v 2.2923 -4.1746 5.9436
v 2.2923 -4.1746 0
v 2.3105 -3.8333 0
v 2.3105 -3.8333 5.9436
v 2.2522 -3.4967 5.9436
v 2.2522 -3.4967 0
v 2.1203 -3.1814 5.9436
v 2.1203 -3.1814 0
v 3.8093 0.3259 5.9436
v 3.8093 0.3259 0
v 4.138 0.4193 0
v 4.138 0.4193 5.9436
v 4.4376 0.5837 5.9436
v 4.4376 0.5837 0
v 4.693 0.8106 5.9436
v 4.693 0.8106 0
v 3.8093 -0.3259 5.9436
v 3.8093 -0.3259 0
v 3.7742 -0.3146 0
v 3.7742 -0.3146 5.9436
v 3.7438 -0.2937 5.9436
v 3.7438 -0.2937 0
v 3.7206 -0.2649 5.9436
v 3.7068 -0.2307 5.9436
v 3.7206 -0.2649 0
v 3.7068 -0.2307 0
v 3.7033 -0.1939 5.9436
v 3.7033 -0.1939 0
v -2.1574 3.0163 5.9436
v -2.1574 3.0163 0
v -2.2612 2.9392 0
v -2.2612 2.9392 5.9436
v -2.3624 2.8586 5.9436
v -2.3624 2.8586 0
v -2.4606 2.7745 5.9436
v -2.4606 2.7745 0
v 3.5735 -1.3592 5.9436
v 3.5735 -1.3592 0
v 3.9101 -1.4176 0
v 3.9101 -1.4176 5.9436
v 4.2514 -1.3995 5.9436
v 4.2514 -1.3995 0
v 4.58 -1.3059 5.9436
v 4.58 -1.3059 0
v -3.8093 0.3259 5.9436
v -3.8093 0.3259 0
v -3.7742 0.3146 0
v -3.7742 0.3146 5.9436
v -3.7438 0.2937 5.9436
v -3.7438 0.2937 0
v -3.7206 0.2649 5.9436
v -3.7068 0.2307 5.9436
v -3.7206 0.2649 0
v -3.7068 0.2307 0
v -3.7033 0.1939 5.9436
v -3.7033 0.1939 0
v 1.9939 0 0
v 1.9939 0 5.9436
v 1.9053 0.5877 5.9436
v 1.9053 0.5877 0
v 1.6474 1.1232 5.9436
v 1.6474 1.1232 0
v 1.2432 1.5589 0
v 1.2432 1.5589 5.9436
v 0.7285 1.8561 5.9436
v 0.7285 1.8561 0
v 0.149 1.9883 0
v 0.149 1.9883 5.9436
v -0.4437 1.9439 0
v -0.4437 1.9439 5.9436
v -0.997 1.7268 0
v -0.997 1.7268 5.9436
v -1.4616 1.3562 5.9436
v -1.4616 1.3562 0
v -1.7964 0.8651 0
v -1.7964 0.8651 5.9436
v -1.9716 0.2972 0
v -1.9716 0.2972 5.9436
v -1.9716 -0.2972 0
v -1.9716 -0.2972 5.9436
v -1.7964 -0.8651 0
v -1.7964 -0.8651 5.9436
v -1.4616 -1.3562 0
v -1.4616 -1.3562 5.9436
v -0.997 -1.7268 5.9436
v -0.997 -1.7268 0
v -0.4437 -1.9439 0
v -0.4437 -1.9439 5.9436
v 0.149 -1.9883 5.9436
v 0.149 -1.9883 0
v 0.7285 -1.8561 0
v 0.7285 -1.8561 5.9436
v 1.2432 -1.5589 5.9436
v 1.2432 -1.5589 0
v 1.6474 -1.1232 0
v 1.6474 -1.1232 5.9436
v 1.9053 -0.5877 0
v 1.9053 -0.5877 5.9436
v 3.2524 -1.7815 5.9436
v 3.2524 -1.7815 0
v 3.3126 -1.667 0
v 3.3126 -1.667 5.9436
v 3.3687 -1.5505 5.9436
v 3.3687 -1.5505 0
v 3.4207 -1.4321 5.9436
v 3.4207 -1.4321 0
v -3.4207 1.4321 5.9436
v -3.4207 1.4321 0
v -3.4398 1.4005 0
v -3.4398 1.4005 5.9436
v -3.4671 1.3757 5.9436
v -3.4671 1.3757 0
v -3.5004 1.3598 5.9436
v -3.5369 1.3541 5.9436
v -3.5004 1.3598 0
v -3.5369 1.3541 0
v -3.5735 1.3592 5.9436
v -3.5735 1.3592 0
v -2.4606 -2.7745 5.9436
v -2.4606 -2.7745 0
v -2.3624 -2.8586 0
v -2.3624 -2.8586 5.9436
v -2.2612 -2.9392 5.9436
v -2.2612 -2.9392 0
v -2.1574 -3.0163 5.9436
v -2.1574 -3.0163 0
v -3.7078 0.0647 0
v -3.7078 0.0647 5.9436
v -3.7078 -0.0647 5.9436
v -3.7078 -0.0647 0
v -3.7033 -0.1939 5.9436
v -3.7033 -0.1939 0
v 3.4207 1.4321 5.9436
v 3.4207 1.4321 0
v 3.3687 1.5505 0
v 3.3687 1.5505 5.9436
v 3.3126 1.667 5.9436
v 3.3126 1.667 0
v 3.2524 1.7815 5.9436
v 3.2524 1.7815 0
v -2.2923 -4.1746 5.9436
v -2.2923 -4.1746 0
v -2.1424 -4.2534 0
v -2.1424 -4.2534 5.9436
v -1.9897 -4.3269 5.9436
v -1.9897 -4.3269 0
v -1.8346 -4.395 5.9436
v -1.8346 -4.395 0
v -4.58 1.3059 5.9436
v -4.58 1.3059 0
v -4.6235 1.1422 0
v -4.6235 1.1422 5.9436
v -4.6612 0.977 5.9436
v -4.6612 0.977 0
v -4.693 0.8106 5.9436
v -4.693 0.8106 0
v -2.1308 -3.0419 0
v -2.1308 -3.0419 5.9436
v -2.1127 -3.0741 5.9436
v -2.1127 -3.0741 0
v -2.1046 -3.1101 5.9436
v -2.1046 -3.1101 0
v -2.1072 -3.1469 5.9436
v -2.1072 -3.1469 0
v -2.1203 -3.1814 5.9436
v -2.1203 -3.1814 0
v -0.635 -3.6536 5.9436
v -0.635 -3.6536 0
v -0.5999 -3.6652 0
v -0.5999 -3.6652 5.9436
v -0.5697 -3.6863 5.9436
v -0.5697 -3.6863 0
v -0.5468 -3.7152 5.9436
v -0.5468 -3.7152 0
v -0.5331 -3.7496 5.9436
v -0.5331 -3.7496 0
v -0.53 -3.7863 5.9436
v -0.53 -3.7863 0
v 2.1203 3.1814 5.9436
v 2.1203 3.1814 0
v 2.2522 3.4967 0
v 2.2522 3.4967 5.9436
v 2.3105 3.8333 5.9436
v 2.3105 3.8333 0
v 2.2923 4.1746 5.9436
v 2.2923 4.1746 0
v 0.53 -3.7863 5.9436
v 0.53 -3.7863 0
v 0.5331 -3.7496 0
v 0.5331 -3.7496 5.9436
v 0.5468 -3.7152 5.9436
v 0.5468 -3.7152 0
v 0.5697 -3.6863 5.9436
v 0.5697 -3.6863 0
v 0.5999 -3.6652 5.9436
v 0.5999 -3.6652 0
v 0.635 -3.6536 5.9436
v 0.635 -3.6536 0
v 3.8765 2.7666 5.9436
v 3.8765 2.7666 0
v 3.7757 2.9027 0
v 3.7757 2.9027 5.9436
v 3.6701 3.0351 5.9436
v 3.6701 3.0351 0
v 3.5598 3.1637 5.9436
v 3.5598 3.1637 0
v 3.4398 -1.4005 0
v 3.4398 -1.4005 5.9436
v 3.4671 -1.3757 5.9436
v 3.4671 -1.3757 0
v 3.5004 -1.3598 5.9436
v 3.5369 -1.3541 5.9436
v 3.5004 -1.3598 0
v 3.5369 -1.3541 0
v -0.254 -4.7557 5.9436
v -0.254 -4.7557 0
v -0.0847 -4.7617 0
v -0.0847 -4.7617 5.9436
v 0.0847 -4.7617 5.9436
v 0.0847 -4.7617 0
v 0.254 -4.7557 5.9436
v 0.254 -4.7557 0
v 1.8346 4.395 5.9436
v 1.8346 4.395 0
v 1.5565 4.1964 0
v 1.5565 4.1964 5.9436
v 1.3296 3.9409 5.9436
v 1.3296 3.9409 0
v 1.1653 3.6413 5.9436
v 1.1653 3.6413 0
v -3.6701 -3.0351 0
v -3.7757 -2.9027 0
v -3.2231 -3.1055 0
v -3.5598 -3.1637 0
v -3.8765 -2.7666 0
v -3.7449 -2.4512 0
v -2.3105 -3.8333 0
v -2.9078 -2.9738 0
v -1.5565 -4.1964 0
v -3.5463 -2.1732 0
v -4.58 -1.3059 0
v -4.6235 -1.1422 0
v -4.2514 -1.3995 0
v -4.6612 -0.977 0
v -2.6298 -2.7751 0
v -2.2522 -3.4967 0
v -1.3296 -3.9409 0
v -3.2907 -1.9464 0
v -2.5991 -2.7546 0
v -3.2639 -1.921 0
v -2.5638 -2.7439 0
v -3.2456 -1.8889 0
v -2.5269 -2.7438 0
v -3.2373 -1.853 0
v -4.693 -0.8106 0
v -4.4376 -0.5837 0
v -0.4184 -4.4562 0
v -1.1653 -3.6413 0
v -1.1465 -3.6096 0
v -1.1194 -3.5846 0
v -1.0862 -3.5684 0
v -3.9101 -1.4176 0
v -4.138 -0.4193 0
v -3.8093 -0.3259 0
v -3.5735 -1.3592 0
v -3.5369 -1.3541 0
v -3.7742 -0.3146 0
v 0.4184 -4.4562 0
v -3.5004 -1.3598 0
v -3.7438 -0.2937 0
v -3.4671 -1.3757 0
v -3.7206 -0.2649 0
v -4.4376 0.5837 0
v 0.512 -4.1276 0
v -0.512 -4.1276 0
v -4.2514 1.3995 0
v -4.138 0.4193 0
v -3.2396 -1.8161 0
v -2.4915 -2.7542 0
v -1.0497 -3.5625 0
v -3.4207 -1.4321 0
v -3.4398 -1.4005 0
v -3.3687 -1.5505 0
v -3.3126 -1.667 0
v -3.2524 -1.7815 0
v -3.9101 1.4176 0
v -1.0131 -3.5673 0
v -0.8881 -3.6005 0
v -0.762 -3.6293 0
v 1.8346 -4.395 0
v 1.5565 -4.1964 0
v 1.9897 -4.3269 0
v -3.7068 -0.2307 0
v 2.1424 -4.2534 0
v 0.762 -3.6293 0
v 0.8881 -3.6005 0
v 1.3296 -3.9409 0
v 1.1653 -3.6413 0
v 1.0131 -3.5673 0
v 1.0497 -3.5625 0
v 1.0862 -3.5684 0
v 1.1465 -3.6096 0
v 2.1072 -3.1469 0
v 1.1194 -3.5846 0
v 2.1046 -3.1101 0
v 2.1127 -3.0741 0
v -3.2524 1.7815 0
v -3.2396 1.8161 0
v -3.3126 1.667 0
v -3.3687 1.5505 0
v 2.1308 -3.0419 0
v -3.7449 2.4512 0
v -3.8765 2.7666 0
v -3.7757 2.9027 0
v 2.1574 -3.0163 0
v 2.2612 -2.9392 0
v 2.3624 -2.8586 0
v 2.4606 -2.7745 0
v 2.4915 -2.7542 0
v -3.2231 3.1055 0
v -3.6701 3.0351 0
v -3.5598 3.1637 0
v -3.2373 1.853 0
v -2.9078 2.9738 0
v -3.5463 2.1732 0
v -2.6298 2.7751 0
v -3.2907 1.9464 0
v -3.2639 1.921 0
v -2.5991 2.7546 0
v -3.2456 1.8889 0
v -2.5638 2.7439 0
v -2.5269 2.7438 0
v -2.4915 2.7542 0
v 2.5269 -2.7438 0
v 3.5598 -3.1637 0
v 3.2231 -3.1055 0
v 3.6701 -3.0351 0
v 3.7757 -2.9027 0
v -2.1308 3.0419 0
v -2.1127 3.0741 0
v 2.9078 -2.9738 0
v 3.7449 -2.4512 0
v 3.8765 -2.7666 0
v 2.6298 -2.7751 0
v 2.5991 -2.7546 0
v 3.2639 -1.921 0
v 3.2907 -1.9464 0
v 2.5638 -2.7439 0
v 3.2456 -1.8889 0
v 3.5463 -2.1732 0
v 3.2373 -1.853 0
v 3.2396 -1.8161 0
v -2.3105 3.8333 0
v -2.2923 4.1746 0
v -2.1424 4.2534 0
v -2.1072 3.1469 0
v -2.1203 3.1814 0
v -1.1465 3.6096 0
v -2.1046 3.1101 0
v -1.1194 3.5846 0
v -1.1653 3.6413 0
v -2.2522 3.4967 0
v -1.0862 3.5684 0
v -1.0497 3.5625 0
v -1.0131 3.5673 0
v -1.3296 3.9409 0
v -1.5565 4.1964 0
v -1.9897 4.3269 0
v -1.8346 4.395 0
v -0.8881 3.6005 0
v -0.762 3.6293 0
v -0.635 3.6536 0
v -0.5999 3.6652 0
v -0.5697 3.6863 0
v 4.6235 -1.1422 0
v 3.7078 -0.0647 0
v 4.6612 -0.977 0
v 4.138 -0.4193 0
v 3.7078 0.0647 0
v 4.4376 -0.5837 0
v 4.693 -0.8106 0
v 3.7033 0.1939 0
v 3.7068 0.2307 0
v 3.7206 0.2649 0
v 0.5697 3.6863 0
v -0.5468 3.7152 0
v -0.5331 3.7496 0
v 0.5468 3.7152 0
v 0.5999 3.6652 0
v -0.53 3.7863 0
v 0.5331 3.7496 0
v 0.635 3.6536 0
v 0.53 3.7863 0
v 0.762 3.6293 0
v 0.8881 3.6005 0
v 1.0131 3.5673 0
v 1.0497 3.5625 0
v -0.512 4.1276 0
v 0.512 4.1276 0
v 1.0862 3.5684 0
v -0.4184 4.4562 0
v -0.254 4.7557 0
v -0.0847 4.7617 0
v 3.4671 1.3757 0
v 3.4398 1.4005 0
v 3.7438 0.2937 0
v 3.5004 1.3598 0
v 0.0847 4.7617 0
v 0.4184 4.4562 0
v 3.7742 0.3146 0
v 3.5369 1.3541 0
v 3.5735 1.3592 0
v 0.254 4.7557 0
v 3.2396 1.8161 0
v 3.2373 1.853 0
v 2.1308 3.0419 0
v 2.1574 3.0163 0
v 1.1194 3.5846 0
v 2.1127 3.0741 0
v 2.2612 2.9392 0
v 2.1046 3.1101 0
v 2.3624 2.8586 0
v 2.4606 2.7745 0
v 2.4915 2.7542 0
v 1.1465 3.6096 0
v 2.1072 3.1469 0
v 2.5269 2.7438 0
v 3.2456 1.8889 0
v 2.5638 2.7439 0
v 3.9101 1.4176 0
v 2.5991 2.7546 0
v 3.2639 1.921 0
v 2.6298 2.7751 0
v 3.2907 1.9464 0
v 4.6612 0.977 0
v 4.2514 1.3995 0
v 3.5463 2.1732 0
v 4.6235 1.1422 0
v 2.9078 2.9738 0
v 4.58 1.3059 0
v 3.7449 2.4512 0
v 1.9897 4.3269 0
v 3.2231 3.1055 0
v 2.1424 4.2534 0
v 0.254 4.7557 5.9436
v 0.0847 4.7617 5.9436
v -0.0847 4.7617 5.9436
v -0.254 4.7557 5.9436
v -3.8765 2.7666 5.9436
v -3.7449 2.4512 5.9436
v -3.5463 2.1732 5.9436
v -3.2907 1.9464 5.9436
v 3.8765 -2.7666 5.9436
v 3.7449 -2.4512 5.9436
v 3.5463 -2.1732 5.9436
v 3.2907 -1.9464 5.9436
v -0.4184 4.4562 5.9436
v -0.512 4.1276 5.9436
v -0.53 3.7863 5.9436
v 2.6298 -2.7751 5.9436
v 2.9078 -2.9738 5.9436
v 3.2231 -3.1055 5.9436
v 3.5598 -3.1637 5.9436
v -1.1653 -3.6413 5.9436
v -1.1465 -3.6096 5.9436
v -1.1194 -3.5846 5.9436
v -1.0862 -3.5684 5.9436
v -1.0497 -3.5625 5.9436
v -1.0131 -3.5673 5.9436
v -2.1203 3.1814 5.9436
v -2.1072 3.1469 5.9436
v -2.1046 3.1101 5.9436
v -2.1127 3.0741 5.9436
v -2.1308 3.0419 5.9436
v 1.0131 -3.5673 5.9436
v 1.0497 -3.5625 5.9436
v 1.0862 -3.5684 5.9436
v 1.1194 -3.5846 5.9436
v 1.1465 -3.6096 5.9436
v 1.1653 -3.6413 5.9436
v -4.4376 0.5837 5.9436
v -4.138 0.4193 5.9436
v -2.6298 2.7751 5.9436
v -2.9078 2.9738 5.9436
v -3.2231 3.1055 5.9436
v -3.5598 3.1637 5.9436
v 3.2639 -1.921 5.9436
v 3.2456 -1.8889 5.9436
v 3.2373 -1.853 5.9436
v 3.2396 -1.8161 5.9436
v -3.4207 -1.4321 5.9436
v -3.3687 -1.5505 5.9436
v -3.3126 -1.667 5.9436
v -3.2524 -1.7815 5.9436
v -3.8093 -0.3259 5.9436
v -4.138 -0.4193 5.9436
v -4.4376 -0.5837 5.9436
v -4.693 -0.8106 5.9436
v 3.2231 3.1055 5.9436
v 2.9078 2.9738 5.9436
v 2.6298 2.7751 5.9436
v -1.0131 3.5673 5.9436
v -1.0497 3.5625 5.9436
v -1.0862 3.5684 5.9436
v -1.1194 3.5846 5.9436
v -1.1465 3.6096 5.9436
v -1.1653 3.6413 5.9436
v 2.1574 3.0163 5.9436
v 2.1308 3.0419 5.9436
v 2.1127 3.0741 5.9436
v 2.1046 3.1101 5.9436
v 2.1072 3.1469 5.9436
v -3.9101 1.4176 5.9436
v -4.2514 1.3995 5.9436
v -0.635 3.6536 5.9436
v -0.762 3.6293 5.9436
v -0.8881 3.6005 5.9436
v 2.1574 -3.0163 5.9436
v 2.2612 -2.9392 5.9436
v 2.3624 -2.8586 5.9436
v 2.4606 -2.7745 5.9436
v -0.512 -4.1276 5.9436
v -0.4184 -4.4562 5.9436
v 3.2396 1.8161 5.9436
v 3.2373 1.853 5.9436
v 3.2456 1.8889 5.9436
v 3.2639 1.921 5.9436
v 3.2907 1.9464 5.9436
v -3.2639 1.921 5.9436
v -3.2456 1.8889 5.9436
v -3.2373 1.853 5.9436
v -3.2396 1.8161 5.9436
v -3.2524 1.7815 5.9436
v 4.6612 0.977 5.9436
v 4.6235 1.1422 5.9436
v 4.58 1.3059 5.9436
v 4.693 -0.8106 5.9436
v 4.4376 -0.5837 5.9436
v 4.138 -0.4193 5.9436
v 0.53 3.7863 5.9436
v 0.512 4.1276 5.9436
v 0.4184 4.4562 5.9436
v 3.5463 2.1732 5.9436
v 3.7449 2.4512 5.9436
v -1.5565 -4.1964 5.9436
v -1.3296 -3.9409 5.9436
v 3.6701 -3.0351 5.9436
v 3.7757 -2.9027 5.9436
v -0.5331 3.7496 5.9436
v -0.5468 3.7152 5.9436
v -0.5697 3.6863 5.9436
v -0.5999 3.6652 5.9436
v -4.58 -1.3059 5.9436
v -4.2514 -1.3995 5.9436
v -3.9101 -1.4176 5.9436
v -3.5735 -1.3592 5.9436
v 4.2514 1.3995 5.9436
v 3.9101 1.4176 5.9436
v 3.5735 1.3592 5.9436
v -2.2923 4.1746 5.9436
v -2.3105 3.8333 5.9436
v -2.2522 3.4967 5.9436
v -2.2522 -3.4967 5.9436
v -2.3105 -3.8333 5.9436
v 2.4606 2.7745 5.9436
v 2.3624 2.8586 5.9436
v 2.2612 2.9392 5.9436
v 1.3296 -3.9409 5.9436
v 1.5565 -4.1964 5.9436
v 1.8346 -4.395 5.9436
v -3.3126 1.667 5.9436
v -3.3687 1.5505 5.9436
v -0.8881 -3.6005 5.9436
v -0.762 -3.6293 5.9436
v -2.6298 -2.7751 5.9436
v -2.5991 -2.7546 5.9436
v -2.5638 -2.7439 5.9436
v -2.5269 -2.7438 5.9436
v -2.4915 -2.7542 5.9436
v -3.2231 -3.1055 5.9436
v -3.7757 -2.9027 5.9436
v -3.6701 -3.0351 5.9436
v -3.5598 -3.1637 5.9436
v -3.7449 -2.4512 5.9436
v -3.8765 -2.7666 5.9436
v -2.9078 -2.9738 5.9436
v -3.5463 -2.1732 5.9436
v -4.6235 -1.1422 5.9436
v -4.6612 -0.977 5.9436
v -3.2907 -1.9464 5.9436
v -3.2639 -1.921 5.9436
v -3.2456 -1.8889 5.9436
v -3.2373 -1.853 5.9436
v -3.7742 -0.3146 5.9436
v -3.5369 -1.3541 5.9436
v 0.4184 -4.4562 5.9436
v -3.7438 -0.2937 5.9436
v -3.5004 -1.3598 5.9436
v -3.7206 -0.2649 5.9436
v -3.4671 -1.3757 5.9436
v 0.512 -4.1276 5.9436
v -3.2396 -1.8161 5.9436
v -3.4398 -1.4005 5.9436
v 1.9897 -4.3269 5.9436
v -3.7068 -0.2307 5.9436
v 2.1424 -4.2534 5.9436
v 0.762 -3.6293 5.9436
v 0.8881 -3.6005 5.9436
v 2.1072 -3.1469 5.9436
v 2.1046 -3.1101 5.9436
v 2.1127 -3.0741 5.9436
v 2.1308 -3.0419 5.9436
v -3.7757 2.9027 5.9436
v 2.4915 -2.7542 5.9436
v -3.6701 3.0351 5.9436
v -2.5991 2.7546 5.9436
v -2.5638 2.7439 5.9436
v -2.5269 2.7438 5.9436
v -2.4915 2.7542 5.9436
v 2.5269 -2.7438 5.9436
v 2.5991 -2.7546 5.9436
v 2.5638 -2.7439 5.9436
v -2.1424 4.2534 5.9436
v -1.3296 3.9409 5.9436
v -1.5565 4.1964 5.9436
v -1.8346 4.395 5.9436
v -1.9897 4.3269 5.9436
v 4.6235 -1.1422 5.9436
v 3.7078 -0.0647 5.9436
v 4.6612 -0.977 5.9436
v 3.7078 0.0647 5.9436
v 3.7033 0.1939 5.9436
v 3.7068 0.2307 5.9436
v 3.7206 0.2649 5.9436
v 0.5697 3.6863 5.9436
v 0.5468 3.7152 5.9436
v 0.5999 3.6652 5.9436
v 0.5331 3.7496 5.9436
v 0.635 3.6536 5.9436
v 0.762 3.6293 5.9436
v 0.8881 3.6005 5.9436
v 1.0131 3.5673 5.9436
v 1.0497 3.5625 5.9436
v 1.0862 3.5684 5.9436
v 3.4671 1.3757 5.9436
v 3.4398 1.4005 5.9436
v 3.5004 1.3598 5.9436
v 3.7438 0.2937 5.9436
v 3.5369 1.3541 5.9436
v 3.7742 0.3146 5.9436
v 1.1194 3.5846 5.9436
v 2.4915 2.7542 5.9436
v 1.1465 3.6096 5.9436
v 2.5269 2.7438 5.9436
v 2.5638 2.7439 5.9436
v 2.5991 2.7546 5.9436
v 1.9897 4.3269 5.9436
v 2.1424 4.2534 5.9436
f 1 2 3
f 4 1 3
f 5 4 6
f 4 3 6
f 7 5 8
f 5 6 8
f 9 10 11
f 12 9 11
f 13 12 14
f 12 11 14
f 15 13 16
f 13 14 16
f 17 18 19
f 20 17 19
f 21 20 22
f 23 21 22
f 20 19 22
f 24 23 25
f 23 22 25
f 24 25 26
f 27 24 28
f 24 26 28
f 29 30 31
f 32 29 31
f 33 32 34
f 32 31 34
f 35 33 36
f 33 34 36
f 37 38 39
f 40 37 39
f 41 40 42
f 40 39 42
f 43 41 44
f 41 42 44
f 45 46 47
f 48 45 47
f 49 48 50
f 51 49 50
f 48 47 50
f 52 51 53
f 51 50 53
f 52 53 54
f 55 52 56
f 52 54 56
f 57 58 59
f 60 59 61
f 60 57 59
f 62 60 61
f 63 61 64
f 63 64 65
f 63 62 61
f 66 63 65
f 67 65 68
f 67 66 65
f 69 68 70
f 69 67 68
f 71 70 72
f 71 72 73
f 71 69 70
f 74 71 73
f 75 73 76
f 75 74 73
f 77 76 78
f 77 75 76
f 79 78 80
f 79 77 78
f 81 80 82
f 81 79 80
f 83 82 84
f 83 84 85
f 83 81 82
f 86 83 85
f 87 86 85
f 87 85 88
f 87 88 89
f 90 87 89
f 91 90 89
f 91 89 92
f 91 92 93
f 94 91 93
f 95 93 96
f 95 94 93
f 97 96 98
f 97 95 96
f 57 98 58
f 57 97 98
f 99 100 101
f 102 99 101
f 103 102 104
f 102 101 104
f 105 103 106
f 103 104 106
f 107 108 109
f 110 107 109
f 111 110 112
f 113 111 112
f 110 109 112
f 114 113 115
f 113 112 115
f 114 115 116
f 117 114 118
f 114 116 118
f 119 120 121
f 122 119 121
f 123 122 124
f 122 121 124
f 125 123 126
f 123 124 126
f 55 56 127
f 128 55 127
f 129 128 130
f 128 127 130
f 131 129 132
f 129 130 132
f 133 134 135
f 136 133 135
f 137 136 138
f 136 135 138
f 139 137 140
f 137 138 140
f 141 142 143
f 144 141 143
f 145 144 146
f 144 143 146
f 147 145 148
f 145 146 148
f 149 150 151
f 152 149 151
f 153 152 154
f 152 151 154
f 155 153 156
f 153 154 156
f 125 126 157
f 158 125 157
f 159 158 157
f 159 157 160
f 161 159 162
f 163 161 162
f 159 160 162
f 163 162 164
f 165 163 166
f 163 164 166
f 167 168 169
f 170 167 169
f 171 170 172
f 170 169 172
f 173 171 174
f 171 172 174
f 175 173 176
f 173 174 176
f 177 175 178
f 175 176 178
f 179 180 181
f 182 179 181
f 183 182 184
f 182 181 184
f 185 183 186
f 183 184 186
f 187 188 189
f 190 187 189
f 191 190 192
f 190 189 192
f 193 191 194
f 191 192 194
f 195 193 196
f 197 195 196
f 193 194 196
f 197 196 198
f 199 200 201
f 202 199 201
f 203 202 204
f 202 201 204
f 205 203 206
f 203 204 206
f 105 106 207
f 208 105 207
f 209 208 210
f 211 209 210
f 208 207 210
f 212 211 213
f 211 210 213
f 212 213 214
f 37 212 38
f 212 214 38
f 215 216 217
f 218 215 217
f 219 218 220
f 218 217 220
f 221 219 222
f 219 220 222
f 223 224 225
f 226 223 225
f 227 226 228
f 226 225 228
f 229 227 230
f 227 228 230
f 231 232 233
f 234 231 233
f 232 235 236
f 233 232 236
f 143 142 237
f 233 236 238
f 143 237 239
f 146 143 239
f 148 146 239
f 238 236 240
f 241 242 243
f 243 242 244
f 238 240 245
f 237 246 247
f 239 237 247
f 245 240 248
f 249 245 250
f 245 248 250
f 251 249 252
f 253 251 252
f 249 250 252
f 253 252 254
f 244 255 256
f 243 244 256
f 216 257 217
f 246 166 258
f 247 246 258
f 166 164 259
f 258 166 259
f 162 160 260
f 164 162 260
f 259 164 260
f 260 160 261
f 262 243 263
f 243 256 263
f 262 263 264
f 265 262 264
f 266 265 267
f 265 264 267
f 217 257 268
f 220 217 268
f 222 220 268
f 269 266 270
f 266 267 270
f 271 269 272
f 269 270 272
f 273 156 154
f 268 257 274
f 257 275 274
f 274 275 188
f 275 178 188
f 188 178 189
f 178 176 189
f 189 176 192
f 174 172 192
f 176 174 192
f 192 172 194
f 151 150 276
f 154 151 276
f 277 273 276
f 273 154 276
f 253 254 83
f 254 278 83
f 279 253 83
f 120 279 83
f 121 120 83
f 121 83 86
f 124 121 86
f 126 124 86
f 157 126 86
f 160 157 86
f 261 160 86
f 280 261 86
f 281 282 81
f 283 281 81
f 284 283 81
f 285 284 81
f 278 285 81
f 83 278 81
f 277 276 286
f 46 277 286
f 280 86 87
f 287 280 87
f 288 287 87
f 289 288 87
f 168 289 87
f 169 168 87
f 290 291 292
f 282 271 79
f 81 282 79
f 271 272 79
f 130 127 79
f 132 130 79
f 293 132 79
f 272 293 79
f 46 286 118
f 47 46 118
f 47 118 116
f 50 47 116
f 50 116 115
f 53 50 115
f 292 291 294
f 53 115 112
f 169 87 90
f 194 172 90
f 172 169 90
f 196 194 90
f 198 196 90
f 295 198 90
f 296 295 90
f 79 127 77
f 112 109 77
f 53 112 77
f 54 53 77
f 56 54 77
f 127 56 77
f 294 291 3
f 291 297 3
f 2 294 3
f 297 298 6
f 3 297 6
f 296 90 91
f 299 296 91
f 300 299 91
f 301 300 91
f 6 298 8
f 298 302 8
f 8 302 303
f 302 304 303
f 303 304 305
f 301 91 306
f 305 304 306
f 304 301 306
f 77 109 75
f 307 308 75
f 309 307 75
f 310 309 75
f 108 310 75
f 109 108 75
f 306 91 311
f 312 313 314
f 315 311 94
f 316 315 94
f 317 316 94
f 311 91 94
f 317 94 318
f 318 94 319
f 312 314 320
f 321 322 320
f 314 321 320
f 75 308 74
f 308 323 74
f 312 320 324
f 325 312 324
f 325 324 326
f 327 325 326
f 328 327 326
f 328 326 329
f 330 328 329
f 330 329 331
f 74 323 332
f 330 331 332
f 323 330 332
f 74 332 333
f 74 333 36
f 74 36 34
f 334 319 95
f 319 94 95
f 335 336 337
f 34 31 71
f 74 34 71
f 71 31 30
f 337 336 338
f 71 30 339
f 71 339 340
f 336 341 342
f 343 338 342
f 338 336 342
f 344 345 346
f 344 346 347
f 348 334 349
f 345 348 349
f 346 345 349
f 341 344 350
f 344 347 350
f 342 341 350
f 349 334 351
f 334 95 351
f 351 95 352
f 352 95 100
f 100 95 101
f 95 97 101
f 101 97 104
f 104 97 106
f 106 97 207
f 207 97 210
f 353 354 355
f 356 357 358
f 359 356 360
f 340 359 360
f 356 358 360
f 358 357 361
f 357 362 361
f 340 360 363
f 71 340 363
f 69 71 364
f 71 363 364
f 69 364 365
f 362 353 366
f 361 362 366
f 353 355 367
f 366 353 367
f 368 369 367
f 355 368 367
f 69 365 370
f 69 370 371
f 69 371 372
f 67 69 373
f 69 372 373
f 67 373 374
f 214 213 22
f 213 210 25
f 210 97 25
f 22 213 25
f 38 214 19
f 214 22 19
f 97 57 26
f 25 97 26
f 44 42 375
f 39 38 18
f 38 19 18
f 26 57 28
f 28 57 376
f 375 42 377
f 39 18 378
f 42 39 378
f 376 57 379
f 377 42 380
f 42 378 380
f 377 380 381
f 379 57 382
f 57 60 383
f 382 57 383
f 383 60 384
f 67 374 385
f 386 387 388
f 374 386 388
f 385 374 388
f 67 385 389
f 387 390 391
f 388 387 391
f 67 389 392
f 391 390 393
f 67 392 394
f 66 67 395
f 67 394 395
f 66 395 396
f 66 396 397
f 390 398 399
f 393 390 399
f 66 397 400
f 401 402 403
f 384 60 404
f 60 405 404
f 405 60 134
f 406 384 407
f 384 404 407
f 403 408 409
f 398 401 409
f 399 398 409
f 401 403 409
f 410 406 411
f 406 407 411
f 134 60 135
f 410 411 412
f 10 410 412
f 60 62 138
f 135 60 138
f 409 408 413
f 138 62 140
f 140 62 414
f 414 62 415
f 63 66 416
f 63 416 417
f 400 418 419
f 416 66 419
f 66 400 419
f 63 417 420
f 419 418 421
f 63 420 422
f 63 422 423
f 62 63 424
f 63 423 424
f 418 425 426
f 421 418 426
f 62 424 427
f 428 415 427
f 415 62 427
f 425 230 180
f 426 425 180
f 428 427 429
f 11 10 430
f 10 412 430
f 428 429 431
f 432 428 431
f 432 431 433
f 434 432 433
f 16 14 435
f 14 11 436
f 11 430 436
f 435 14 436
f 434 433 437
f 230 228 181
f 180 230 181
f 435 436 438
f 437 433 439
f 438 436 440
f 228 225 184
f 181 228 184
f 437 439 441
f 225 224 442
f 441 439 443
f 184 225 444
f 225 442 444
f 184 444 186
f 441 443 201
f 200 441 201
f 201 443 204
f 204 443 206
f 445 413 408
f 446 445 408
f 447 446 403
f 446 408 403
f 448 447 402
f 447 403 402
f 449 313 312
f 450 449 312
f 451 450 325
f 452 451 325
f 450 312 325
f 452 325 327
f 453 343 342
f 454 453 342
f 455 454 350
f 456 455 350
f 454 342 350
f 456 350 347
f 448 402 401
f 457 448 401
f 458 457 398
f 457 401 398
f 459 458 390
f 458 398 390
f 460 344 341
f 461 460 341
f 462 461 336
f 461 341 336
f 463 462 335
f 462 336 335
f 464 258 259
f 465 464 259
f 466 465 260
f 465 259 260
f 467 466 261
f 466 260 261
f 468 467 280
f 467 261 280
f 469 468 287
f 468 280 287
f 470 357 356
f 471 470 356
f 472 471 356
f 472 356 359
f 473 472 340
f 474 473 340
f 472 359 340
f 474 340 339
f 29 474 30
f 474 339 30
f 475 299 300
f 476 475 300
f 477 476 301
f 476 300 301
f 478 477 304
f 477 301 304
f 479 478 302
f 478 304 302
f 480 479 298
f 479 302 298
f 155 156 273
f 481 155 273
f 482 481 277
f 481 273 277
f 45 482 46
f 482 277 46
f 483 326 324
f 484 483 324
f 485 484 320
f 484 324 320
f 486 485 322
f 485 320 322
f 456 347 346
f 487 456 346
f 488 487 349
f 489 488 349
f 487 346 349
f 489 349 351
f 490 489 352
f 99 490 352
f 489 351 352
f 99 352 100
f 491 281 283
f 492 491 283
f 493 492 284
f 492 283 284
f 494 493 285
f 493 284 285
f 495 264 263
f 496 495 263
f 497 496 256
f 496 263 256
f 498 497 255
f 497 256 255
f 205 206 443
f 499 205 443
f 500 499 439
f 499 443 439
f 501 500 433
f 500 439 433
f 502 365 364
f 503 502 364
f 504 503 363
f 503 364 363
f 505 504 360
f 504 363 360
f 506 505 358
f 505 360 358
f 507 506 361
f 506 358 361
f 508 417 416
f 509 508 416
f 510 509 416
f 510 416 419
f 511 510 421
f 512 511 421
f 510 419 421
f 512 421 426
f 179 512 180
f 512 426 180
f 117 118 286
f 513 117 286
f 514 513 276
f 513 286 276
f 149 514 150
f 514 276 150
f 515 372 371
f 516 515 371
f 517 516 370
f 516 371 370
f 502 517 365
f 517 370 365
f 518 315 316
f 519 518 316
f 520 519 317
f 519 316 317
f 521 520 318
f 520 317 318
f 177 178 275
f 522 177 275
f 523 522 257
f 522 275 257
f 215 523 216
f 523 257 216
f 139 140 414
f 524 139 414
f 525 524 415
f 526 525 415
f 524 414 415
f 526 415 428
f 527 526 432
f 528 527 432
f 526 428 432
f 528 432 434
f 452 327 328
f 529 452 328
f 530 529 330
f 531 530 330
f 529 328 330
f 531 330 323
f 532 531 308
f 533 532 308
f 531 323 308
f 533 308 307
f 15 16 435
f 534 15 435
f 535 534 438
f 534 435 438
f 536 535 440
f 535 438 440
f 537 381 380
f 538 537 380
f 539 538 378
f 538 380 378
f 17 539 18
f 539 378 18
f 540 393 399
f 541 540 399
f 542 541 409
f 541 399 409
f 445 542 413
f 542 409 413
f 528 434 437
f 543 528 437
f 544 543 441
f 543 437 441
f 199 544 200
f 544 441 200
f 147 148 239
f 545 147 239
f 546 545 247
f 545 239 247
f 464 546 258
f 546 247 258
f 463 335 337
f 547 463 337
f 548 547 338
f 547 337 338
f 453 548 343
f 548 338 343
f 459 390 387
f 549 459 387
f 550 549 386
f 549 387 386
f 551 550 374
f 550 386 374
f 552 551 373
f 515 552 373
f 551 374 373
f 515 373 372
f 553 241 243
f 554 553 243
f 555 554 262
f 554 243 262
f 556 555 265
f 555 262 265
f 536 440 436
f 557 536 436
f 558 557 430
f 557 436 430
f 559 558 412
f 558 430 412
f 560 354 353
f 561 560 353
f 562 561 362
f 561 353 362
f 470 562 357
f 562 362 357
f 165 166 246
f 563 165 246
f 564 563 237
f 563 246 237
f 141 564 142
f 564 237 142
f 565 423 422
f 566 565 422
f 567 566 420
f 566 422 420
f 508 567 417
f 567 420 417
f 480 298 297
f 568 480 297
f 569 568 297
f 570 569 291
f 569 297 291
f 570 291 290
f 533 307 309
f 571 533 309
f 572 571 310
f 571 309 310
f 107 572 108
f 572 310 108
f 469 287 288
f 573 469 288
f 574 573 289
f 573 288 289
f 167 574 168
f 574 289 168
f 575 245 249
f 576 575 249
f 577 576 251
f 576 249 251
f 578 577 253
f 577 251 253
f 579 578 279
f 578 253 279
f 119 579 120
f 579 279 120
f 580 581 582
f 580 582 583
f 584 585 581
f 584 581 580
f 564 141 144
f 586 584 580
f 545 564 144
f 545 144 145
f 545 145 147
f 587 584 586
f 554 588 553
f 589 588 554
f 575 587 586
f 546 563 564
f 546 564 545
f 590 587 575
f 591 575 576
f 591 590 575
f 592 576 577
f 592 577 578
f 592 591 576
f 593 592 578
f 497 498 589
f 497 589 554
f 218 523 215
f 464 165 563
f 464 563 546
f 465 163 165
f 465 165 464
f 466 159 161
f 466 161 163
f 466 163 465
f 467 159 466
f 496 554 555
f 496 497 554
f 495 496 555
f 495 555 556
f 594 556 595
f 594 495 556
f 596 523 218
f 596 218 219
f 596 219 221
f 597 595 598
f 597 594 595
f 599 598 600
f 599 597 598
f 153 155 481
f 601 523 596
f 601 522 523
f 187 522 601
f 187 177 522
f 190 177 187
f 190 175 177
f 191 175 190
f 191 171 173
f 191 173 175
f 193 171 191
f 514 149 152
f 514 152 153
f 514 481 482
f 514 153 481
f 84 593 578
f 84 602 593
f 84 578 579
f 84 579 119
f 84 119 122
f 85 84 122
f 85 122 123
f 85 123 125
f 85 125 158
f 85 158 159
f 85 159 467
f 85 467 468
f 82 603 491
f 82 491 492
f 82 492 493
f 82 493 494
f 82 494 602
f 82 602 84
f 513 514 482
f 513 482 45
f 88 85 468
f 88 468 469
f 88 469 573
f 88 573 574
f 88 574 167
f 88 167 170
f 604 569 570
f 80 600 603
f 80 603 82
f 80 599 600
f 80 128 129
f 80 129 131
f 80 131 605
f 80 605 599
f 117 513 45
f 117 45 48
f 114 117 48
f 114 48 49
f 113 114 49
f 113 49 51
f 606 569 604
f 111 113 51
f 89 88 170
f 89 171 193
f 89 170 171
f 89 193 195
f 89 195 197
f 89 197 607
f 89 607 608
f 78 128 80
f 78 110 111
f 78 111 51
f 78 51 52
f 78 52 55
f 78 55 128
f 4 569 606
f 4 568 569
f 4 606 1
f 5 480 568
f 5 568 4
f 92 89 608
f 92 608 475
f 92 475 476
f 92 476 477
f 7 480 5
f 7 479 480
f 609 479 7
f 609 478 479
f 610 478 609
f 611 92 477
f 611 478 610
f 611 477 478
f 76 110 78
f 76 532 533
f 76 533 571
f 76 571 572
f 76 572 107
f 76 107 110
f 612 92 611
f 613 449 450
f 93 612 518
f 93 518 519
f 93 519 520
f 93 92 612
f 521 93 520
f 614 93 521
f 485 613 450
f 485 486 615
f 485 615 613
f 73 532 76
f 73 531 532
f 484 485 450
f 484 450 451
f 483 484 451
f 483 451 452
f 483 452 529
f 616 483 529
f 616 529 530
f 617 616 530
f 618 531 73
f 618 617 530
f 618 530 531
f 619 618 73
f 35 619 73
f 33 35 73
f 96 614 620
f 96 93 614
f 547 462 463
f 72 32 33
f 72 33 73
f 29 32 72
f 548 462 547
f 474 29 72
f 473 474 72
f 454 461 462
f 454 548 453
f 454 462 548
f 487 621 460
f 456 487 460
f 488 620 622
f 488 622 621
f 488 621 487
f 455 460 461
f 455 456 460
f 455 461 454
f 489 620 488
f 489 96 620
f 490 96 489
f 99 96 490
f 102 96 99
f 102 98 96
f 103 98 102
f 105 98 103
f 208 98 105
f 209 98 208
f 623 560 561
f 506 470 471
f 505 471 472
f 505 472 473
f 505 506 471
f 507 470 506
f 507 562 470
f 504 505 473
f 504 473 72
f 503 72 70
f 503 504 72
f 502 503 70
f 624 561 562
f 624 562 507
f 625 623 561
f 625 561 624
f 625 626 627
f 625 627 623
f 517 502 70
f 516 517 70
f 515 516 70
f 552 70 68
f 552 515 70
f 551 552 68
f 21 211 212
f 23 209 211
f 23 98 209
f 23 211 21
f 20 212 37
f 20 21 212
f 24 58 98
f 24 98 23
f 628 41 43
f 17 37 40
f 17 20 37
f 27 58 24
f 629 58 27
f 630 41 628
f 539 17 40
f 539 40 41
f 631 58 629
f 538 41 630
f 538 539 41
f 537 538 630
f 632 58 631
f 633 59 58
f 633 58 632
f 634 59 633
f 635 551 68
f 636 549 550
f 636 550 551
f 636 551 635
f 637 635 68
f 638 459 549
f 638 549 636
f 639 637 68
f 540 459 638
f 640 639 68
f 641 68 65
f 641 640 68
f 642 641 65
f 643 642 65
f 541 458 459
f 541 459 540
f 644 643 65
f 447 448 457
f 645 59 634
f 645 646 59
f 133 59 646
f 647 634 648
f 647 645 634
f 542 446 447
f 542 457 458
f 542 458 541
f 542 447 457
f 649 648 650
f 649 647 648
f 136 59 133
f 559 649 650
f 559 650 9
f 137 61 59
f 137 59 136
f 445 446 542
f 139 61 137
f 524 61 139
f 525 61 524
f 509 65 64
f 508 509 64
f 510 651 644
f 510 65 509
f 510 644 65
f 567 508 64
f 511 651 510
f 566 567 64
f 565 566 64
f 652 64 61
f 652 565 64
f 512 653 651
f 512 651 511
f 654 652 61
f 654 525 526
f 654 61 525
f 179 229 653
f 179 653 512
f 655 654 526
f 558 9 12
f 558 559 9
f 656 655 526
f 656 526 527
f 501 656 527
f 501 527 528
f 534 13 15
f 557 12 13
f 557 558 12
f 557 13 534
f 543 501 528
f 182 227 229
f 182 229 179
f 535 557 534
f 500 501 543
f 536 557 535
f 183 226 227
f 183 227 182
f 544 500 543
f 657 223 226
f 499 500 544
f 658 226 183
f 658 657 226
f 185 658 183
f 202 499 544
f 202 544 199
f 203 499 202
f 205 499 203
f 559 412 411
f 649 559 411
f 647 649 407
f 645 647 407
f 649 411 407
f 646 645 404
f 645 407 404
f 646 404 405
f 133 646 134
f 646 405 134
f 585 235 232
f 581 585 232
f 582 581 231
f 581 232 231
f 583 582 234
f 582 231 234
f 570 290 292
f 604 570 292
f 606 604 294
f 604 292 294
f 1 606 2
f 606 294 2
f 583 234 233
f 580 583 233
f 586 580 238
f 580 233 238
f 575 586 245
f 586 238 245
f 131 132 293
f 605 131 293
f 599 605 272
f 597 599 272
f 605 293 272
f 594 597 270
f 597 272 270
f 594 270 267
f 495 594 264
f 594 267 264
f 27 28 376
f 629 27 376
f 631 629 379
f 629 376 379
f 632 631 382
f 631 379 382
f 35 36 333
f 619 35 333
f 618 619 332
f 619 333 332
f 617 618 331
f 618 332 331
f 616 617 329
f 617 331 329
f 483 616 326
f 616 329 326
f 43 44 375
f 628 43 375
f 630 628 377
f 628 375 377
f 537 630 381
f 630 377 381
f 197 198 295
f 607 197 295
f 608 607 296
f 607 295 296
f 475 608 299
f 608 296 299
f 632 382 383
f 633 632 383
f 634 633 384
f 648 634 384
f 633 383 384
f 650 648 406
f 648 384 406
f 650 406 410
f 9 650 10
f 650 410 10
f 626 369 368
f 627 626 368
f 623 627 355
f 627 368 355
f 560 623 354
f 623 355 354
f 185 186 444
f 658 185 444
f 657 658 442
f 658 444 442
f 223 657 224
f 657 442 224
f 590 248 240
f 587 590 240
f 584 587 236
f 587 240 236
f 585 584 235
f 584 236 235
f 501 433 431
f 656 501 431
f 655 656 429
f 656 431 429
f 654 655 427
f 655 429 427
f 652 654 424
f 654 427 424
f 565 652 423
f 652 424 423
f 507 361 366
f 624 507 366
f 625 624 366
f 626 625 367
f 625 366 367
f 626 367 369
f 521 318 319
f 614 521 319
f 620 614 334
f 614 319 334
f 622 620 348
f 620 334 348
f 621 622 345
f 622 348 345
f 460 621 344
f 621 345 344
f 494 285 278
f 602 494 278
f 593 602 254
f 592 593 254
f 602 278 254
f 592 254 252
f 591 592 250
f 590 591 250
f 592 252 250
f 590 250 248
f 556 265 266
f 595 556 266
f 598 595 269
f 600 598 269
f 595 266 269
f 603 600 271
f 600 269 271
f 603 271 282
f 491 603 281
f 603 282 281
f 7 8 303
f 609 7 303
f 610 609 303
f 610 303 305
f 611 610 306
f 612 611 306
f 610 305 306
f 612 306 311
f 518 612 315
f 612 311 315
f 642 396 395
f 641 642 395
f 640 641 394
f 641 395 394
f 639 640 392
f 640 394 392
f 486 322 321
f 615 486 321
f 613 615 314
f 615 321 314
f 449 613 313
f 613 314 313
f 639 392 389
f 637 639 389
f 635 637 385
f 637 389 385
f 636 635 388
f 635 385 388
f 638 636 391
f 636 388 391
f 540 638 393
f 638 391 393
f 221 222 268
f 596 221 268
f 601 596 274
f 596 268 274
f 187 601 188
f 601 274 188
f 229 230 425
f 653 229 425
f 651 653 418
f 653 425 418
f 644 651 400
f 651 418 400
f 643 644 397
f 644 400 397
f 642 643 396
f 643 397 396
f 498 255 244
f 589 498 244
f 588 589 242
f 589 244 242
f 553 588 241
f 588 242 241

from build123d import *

# Parameters (mm, degrees)
F0_R     = 1.9939
F1_DEPTH = 5.9436


with BuildPart() as f1:
    # F0 (on Top) → F1 (new body)
    with BuildSketch(Plane.XY):
        with BuildLine():
            ThreePointArc((1.165337, 3.64131), (1.103355, 3.575271), (1.013135, 3.567322))
            ThreePointArc((1.013135, 3.567322), (0.825197, 3.615423), (0.635, 3.653629))
            ThreePointArc((0.635, 3.653629), (0.557163, 3.699936), (0.529973, 3.786328))
            ThreePointArc((0.529973, 3.786328), (0.474446, 4.2945), (0.254, 4.755722))
            ThreePointArc((0.254, 4.755722), (0, 4.7625), (-0.254, 4.755722))
            ThreePointArc((-0.254, 4.755722), (-0.474446, 4.2945), (-0.529973, 3.786328))
            ThreePointArc((-0.529973, 3.786328), (-0.557163, 3.699936), (-0.635, 3.653629))
            ThreePointArc((-0.635, 3.653629), (-0.825197, 3.615423), (-1.013135, 3.567322))
            ThreePointArc((-1.013135, 3.567322), (-1.103355, 3.575271), (-1.165337, 3.64131))
            ThreePointArc((-1.165337, 3.64131), (-1.435853, 4.075065), (-1.834584, 4.394964))
            ThreePointArc((-1.834584, 4.394964), (-2.066371, 4.290864), (-2.292276, 4.174551))
            ThreePointArc((-2.292276, 4.174551), (-2.290774, 3.663356), (-2.120315, 3.181417))
            ThreePointArc((-2.120315, 3.181417), (-2.107329, 3.091783), (-2.157365, 3.01629))
            ThreePointArc((-2.157365, 3.01629), (-2.31215, 2.899344), (-2.460606, 2.774463))
            ThreePointArc((-2.460606, 2.774463), (-2.545341, 2.74248), (-2.629838, 2.775086))
            ThreePointArc((-2.629838, 2.775086), (-3.061763, 3.048513), (-3.559807, 3.163729))
            ThreePointArc((-3.559807, 3.163729), (-3.723472, 2.96937), (-3.876539, 2.766559))
            ThreePointArc((-3.876539, 2.766559), (-3.653387, 2.30664), (-3.290703, 1.946387))
            ThreePointArc((-3.290703, 1.946387), (-3.240112, 1.871264), (-3.252438, 1.781537))
            ThreePointArc((-3.252438, 1.781537), (-3.341153, 1.609014), (-3.420724, 1.432088))
            ThreePointArc((-3.420724, 1.432088), (-3.48319, 1.366507), (-3.573466, 1.359222))
            ThreePointArc((-3.573466, 1.359222), (-4.081254, 1.418166), (-4.579966, 1.305879))
            ThreePointArc((-4.579966, 1.305879), (-4.643094, 1.059756), (-4.693006, 0.810616))
            ThreePointArc((-4.693006, 0.810616), (-4.292402, 0.493066), (-3.809327, 0.325852))
            ThreePointArc((-3.809327, 0.325852), (-3.731151, 0.280119), (-3.703326, 0.19393))
            ThreePointArc((-3.703326, 0.19393), (-3.7084, 0), (-3.703326, -0.19393))
            ThreePointArc((-3.703326, -0.19393), (-3.731151, -0.280119), (-3.809327, -0.325852))
            ThreePointArc((-3.809327, -0.325852), (-4.292402, -0.493066), (-4.693006, -0.810616))
            ThreePointArc((-4.693006, -0.810616), (-4.643094, -1.059756), (-4.579966, -1.305879))
            ThreePointArc((-4.579966, -1.305879), (-4.081254, -1.418166), (-3.573466, -1.359222))
            ThreePointArc((-3.573466, -1.359222), (-3.48319, -1.366507), (-3.420724, -1.432088))
            ThreePointArc((-3.420724, -1.432088), (-3.341153, -1.609014), (-3.252438, -1.781537))
            ThreePointArc((-3.252438, -1.781537), (-3.240112, -1.871264), (-3.290703, -1.946387))
            ThreePointArc((-3.290703, -1.946387), (-3.653387, -2.30664), (-3.876539, -2.766559))
            ThreePointArc((-3.876539, -2.766559), (-3.723472, -2.96937), (-3.559807, -3.163729))
            ThreePointArc((-3.559807, -3.163729), (-3.061763, -3.048513), (-2.629838, -2.775086))
            ThreePointArc((-2.629838, -2.775086), (-2.545341, -2.74248), (-2.460606, -2.774463))
            ThreePointArc((-2.460606, -2.774463), (-2.31215, -2.899344), (-2.157365, -3.01629))
            ThreePointArc((-2.157365, -3.01629), (-2.107329, -3.091783), (-2.120315, -3.181417))
            ThreePointArc((-2.120315, -3.181417), (-2.290774, -3.663356), (-2.292276, -4.174551))
            ThreePointArc((-2.292276, -4.174551), (-2.066371, -4.290864), (-1.834584, -4.394964))
            ThreePointArc((-1.834584, -4.394964), (-1.435853, -4.075065), (-1.165337, -3.64131))
            ThreePointArc((-1.165337, -3.64131), (-1.103355, -3.575271), (-1.013135, -3.567322))
            ThreePointArc((-1.013135, -3.567322), (-0.825197, -3.615423), (-0.635, -3.653629))
            ThreePointArc((-0.635, -3.653629), (-0.557163, -3.699936), (-0.529973, -3.786328))
            ThreePointArc((-0.529973, -3.786328), (-0.474446, -4.2945), (-0.254, -4.755722))
            ThreePointArc((-0.254, -4.755722), (0, -4.7625), (0.254, -4.755722))
            ThreePointArc((0.254, -4.755722), (0.474446, -4.2945), (0.529973, -3.786328))
            ThreePointArc((0.529973, -3.786328), (0.557163, -3.699936), (0.635, -3.653629))
            ThreePointArc((0.635, -3.653629), (0.825197, -3.615423), (1.013135, -3.567322))
            ThreePointArc((1.013135, -3.567322), (1.103355, -3.575271), (1.165337, -3.64131))
            ThreePointArc((1.165337, -3.64131), (1.435853, -4.075065), (1.834584, -4.394964))
            ThreePointArc((1.834584, -4.394964), (2.066371, -4.290864), (2.292276, -4.174551))
            ThreePointArc((2.292276, -4.174551), (2.290774, -3.663356), (2.120315, -3.181417))
            ThreePointArc((2.120315, -3.181417), (2.107329, -3.091783), (2.157365, -3.01629))
            ThreePointArc((2.157365, -3.01629), (2.31215, -2.899344), (2.460606, -2.774463))
            ThreePointArc((2.460606, -2.774463), (2.545341, -2.74248), (2.629838, -2.775086))
            ThreePointArc((2.629838, -2.775086), (3.061763, -3.048513), (3.559807, -3.163729))
            ThreePointArc((3.559807, -3.163729), (3.723472, -2.96937), (3.876539, -2.766559))
            ThreePointArc((3.876539, -2.766559), (3.653387, -2.30664), (3.290703, -1.946387))
            ThreePointArc((3.290703, -1.946387), (3.240112, -1.871264), (3.252438, -1.781537))
            ThreePointArc((3.252438, -1.781537), (3.341153, -1.609014), (3.420724, -1.432088))
            ThreePointArc((3.420724, -1.432088), (3.48319, -1.366507), (3.573466, -1.359222))
            ThreePointArc((3.573466, -1.359222), (4.081254, -1.418166), (4.579966, -1.305879))
            ThreePointArc((4.579966, -1.305879), (4.643094, -1.059756), (4.693006, -0.810616))
            ThreePointArc((4.693006, -0.810616), (4.292402, -0.493066), (3.809327, -0.325852))
            ThreePointArc((3.809327, -0.325852), (3.731151, -0.280119), (3.703326, -0.19393))
            ThreePointArc((3.703326, -0.19393), (3.7084, 0), (3.703326, 0.19393))
            ThreePointArc((3.703326, 0.19393), (3.731151, 0.280119), (3.809327, 0.325852))
            ThreePointArc((3.809327, 0.325852), (4.292402, 0.493066), (4.693006, 0.810616))
            ThreePointArc((4.693006, 0.810616), (4.643094, 1.059756), (4.579966, 1.305879))
            ThreePointArc((4.579966, 1.305879), (4.081254, 1.418166), (3.573466, 1.359222))
            ThreePointArc((3.573466, 1.359222), (3.48319, 1.366507), (3.420724, 1.432088))
            ThreePointArc((3.420724, 1.432088), (3.341153, 1.609014), (3.252438, 1.781537))
            ThreePointArc((3.252438, 1.781537), (3.240112, 1.871264), (3.290703, 1.946387))
            ThreePointArc((3.290703, 1.946387), (3.653387, 2.30664), (3.876539, 2.766559))
            ThreePointArc((3.876539, 2.766559), (3.723472, 2.96937), (3.559807, 3.163729))
            ThreePointArc((3.559807, 3.163729), (3.061763, 3.048513), (2.629838, 2.775086))
            ThreePointArc((2.629838, 2.775086), (2.545341, 2.74248), (2.460606, 2.774463))
            ThreePointArc((2.460606, 2.774463), (2.31215, 2.899344), (2.157365, 3.01629))
            ThreePointArc((2.157365, 3.01629), (2.107329, 3.091783), (2.120315, 3.181417))
            ThreePointArc((2.120315, 3.181417), (2.290774, 3.663356), (2.292276, 4.174551))
            ThreePointArc((2.292276, 4.174551), (2.066371, 4.290864), (1.834584, 4.394964))
            ThreePointArc((1.834584, 4.394964), (1.435853, 4.075065), (1.165337, 3.64131))
        make_face()
        Circle(F0_R, mode=Mode.SUBTRACT)
    extrude(amount=F1_DEPTH)


solid = f1.part
